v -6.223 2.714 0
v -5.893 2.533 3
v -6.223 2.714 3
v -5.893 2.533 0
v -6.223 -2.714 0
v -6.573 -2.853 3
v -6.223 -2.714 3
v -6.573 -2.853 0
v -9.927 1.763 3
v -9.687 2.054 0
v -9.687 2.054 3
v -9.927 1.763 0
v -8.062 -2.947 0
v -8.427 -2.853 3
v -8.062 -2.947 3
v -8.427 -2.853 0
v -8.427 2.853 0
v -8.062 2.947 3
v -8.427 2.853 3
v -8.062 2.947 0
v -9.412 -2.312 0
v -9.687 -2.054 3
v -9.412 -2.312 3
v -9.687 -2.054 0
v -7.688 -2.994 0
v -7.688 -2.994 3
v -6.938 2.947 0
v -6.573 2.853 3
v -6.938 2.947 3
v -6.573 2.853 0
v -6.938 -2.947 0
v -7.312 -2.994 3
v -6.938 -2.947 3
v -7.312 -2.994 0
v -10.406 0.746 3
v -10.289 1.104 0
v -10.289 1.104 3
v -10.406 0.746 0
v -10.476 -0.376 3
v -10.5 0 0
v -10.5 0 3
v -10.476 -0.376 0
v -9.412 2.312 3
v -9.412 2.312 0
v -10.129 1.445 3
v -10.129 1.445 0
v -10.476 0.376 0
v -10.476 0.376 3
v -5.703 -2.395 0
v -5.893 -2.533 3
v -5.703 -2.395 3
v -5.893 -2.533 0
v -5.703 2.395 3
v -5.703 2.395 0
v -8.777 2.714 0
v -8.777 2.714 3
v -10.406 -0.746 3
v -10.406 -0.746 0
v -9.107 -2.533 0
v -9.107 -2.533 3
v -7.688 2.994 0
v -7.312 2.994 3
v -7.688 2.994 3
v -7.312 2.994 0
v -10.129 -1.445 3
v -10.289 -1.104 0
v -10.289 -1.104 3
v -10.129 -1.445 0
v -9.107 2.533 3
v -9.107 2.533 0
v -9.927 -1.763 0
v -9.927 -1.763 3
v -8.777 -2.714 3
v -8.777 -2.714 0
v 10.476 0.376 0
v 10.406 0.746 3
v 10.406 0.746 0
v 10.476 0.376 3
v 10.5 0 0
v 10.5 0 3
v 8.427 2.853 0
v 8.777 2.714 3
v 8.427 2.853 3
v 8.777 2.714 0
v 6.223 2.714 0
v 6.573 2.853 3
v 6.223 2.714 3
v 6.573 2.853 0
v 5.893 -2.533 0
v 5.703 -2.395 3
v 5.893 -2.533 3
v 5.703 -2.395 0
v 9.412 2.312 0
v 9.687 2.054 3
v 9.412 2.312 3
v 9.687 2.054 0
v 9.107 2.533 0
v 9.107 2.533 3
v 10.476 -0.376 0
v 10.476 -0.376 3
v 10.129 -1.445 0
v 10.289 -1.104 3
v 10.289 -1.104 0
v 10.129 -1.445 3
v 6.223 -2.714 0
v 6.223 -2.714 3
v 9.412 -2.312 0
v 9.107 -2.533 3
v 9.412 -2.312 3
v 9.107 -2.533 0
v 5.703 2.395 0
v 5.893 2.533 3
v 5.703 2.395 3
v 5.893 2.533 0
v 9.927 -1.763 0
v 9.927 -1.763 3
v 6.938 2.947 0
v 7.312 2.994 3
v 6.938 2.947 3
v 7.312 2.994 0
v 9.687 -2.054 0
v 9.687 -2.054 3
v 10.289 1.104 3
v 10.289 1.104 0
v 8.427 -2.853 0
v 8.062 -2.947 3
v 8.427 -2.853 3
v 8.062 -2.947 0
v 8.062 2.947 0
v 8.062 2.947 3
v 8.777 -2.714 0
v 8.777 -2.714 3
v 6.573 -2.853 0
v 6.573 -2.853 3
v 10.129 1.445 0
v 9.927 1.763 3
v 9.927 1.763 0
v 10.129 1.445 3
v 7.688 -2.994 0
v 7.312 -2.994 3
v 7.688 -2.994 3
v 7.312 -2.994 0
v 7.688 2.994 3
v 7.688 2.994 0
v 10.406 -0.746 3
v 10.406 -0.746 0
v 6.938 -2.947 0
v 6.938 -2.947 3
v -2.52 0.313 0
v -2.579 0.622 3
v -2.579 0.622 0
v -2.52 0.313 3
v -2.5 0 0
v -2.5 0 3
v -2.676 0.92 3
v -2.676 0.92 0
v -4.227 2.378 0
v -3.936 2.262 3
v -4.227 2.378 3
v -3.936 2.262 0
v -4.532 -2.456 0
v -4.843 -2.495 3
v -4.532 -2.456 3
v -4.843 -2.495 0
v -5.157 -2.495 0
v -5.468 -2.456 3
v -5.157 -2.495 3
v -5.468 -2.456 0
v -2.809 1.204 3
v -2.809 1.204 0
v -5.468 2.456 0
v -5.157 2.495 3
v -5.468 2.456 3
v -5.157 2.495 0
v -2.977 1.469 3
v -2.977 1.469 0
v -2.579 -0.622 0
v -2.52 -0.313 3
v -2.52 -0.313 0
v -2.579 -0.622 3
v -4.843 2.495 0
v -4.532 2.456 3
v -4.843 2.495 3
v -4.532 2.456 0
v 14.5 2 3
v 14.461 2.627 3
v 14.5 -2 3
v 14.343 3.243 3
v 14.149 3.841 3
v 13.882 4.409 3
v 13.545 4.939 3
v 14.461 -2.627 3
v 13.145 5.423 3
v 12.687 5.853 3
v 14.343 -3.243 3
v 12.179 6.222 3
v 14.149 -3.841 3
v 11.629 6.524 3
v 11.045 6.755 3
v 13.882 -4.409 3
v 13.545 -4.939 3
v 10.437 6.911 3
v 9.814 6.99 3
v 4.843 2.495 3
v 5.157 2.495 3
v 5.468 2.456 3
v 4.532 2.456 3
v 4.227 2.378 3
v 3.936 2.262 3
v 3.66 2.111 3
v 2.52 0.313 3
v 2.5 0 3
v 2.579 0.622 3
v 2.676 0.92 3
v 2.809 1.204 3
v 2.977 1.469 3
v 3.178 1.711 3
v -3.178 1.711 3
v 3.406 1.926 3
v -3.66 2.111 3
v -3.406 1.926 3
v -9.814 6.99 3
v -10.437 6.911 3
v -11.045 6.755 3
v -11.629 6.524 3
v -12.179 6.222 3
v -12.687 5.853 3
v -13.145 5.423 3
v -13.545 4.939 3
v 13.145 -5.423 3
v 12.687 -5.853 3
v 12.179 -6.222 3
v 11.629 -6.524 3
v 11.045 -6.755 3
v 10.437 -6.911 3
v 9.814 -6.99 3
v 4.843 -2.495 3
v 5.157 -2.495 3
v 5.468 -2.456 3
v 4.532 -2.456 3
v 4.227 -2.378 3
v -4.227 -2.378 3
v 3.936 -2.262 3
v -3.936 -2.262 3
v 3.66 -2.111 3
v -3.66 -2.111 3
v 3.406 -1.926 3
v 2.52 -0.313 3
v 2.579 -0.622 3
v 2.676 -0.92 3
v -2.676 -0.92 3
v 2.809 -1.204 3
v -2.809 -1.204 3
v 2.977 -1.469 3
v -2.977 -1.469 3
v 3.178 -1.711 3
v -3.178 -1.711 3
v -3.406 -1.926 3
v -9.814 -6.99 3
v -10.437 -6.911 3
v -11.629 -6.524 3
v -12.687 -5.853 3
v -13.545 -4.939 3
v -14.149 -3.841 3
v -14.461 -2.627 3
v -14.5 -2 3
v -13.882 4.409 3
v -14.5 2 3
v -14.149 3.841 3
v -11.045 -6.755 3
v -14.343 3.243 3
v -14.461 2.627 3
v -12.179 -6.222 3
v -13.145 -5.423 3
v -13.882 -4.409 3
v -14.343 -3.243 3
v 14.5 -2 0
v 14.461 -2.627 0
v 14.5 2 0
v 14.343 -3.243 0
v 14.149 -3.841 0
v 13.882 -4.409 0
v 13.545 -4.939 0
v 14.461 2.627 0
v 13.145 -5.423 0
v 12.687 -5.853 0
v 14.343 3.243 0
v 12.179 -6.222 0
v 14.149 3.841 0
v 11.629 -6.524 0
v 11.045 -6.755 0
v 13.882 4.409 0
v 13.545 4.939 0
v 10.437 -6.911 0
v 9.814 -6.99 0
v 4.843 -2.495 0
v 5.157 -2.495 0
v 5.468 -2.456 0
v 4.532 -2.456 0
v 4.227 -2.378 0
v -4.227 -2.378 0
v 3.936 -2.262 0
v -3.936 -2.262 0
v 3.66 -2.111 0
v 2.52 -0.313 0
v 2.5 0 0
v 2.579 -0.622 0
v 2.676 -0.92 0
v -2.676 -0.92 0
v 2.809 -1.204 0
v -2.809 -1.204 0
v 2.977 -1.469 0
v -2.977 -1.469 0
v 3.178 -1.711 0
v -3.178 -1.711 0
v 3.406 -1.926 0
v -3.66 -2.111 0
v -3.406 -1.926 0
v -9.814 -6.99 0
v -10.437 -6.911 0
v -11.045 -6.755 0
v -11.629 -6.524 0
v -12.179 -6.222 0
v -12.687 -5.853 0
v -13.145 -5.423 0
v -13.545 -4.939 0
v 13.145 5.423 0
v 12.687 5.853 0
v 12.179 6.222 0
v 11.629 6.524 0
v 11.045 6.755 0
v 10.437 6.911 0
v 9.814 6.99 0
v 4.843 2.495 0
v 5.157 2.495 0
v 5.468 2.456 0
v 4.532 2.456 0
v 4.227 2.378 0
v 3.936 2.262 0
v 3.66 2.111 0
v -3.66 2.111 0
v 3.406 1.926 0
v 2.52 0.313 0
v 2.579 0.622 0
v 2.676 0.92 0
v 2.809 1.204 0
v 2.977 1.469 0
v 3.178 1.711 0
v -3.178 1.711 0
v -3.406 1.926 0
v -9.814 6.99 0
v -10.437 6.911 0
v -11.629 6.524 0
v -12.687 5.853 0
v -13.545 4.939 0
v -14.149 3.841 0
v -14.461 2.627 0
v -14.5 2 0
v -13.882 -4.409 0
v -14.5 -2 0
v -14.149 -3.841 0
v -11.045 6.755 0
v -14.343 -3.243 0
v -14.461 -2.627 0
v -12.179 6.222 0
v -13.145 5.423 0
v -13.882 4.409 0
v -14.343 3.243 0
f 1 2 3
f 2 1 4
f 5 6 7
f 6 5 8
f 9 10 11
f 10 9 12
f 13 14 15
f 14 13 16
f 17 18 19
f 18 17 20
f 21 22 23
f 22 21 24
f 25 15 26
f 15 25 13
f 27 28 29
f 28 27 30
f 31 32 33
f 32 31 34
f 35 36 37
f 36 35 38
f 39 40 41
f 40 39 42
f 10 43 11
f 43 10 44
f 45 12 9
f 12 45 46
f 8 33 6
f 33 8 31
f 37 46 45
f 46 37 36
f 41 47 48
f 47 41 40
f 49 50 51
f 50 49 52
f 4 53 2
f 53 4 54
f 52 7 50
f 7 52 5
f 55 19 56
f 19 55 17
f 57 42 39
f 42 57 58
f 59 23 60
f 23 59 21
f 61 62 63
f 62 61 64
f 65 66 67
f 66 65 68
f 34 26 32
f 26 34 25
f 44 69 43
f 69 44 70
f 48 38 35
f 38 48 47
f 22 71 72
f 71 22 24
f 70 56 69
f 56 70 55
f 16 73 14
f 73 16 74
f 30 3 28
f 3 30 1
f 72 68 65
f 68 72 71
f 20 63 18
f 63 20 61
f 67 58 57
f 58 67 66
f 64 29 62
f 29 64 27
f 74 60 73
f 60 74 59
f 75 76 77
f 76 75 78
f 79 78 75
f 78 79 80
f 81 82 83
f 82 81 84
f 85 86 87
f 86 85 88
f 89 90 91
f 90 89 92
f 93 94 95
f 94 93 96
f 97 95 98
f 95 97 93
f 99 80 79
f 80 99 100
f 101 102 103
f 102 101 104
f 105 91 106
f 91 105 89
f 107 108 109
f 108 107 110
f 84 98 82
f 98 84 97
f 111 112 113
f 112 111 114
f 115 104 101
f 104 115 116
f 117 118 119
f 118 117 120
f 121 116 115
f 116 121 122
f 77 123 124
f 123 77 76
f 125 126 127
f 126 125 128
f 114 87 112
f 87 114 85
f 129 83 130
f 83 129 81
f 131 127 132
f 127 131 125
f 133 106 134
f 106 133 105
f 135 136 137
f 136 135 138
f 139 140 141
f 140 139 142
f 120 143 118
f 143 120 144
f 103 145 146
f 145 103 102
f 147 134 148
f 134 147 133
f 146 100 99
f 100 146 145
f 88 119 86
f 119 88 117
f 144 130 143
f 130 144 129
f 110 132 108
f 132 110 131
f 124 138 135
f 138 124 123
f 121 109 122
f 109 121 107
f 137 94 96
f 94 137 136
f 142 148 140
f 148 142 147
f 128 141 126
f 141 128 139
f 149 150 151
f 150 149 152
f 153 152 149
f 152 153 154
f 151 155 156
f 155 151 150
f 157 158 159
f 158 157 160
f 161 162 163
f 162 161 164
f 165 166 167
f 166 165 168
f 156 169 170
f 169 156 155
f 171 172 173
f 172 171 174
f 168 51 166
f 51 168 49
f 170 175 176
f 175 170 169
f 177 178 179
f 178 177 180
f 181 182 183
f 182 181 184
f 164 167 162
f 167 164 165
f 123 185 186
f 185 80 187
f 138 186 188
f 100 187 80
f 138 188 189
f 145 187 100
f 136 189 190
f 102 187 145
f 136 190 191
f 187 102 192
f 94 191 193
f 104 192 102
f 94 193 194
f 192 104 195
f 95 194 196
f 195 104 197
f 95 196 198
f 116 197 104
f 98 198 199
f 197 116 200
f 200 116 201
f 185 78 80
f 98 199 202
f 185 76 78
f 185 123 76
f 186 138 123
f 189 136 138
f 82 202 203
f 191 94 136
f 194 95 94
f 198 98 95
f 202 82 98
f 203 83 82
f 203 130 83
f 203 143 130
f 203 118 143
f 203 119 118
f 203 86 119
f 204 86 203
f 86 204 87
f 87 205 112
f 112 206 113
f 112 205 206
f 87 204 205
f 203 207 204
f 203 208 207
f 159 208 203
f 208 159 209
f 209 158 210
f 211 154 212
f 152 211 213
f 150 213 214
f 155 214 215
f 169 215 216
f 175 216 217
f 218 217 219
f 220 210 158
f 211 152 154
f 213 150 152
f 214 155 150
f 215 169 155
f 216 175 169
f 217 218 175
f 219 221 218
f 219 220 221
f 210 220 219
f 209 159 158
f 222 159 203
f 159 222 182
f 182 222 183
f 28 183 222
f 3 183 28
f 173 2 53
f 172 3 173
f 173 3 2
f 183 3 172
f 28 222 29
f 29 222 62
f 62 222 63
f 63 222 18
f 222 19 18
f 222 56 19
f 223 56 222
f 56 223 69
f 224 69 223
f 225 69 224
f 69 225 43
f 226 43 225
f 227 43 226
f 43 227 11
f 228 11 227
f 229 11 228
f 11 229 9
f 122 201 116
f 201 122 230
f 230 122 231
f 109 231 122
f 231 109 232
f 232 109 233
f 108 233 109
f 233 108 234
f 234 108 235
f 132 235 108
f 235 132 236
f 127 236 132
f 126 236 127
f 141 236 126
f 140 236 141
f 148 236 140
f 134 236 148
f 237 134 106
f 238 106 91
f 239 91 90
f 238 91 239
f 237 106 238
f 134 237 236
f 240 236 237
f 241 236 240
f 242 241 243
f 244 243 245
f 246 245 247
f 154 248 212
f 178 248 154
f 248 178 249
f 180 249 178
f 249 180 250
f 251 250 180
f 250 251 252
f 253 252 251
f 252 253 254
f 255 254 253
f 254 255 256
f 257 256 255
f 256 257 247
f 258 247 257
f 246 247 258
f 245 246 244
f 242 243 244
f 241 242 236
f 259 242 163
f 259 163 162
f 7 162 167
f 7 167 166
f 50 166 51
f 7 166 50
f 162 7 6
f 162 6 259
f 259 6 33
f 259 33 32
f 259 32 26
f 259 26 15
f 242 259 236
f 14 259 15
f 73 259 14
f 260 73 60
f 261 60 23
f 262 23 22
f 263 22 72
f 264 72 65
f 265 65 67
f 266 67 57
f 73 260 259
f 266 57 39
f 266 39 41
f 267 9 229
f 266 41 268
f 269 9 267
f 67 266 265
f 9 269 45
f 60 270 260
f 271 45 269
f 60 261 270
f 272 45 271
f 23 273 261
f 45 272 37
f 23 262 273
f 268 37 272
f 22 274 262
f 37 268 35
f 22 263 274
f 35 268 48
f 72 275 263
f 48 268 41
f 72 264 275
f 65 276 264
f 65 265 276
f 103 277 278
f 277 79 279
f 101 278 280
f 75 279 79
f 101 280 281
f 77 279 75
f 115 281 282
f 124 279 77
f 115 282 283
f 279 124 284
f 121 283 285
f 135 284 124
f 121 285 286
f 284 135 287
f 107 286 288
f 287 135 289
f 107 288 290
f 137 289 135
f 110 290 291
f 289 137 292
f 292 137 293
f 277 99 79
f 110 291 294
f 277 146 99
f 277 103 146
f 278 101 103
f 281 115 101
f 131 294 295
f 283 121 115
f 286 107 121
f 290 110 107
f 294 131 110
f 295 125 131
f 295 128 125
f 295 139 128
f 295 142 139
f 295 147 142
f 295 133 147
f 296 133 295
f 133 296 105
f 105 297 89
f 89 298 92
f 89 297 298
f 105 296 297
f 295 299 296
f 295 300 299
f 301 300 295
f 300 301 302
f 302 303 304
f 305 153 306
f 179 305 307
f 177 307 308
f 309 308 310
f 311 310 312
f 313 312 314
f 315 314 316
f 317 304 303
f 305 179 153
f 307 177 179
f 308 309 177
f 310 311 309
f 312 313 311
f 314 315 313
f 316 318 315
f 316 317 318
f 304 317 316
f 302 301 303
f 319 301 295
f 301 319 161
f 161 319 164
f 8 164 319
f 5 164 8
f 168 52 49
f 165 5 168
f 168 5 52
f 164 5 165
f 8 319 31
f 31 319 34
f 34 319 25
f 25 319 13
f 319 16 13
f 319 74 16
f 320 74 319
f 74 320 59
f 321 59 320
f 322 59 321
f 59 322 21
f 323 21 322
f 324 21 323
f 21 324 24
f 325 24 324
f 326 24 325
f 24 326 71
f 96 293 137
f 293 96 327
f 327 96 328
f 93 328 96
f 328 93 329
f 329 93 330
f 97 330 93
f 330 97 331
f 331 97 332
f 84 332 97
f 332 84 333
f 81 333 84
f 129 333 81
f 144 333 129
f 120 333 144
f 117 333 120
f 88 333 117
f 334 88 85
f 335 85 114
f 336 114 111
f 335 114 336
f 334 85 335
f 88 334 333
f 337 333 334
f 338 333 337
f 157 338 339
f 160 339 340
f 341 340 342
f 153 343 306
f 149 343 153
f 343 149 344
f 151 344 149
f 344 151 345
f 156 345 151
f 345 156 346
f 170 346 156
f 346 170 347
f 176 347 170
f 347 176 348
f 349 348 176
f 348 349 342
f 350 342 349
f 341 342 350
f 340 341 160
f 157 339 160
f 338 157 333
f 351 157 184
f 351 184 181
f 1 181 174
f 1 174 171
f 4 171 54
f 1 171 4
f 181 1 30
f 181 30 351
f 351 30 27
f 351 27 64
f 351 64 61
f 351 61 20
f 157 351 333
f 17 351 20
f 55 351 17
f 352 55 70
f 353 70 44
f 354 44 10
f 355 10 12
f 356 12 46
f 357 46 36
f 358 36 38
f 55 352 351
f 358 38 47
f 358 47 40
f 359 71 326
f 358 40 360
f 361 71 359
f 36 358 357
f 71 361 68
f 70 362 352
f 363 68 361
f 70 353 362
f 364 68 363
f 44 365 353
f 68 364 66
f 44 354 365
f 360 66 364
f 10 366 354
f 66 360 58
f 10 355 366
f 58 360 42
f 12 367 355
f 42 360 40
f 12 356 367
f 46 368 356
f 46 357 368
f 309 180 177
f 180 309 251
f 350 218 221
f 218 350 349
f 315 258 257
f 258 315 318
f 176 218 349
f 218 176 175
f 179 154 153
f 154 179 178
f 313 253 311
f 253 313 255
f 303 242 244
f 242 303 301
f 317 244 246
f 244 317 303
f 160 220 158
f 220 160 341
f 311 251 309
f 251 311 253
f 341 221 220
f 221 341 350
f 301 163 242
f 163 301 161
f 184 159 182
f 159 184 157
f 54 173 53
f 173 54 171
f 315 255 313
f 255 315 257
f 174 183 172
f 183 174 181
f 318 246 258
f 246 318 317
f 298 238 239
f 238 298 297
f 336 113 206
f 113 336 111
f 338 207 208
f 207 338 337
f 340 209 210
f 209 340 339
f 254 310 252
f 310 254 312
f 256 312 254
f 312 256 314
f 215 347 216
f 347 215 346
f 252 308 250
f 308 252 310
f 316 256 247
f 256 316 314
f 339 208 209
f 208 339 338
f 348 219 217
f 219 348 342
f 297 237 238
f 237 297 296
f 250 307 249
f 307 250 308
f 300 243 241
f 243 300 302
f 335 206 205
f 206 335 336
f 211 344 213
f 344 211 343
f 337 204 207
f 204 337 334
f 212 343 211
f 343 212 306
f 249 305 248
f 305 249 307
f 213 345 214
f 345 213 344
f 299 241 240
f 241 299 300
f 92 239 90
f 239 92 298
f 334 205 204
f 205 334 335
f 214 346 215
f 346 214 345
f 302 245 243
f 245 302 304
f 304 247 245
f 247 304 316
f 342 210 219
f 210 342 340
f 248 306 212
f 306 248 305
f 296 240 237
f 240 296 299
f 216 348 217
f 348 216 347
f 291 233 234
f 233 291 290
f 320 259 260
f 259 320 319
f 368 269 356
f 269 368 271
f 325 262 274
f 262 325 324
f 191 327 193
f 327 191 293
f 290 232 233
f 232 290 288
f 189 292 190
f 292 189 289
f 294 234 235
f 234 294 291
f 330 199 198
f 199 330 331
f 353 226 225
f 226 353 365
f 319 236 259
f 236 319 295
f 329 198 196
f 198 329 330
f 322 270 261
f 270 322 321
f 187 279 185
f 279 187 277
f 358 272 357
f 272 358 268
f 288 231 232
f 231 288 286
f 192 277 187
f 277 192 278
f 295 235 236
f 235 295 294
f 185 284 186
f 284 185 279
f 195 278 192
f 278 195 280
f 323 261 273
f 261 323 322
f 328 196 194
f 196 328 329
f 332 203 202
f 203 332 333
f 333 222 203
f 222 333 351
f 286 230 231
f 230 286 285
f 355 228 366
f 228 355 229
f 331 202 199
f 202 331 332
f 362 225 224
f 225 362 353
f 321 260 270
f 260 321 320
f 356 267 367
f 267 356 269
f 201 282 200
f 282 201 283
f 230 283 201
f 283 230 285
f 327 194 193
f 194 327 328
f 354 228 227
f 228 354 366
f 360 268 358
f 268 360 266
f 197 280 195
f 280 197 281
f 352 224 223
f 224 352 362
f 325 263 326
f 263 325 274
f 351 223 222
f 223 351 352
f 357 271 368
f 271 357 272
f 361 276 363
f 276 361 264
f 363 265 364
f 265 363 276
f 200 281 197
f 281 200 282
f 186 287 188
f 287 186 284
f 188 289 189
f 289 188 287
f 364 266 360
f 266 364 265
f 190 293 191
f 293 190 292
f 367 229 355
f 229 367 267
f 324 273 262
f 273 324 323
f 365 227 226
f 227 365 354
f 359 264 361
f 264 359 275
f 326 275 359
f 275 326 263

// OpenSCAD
$fn = 50;


difference() {
	union() {
		hull() {
			translate(v = [-9.5000000000, 2.0000000000, 0]) {
				cylinder(h = 3, r = 5);
			}
			translate(v = [9.5000000000, 2.0000000000, 0]) {
				cylinder(h = 3, r = 5);
			}
			translate(v = [-9.5000000000, -2.0000000000, 0]) {
				cylinder(h = 3, r = 5);
			}
			translate(v = [9.5000000000, -2.0000000000, 0]) {
				cylinder(h = 3, r = 5);
			}
		}
	}
	union() {
		#translate(v = [-7.5000000000, 0.0000000000, -100.0000000000]) {
			cylinder(h = 200, r = 3.0000000000);
		}
		#translate(v = [-7.5000000000, 0.0000000000, -100.0000000000]) {
			cylinder(h = 200, r = 3.0000000000);
		}
		#translate(v = [7.5000000000, 0.0000000000, -100.0000000000]) {
			cylinder(h = 200, r = 3.0000000000);
		}
		#translate(v = [7.5000000000, 0.0000000000, -100.0000000000]) {
			cylinder(h = 200, r = 3.0000000000);
		}
		#translate(v = [-5.0000000000, 0, 0]) {
			cylinder(h = 3, r = 2.5000000000);
		}
		#translate(v = [5.0000000000, 0, 0]) {
			cylinder(h = 3, r = 2.5000000000);
		}
	}
}
